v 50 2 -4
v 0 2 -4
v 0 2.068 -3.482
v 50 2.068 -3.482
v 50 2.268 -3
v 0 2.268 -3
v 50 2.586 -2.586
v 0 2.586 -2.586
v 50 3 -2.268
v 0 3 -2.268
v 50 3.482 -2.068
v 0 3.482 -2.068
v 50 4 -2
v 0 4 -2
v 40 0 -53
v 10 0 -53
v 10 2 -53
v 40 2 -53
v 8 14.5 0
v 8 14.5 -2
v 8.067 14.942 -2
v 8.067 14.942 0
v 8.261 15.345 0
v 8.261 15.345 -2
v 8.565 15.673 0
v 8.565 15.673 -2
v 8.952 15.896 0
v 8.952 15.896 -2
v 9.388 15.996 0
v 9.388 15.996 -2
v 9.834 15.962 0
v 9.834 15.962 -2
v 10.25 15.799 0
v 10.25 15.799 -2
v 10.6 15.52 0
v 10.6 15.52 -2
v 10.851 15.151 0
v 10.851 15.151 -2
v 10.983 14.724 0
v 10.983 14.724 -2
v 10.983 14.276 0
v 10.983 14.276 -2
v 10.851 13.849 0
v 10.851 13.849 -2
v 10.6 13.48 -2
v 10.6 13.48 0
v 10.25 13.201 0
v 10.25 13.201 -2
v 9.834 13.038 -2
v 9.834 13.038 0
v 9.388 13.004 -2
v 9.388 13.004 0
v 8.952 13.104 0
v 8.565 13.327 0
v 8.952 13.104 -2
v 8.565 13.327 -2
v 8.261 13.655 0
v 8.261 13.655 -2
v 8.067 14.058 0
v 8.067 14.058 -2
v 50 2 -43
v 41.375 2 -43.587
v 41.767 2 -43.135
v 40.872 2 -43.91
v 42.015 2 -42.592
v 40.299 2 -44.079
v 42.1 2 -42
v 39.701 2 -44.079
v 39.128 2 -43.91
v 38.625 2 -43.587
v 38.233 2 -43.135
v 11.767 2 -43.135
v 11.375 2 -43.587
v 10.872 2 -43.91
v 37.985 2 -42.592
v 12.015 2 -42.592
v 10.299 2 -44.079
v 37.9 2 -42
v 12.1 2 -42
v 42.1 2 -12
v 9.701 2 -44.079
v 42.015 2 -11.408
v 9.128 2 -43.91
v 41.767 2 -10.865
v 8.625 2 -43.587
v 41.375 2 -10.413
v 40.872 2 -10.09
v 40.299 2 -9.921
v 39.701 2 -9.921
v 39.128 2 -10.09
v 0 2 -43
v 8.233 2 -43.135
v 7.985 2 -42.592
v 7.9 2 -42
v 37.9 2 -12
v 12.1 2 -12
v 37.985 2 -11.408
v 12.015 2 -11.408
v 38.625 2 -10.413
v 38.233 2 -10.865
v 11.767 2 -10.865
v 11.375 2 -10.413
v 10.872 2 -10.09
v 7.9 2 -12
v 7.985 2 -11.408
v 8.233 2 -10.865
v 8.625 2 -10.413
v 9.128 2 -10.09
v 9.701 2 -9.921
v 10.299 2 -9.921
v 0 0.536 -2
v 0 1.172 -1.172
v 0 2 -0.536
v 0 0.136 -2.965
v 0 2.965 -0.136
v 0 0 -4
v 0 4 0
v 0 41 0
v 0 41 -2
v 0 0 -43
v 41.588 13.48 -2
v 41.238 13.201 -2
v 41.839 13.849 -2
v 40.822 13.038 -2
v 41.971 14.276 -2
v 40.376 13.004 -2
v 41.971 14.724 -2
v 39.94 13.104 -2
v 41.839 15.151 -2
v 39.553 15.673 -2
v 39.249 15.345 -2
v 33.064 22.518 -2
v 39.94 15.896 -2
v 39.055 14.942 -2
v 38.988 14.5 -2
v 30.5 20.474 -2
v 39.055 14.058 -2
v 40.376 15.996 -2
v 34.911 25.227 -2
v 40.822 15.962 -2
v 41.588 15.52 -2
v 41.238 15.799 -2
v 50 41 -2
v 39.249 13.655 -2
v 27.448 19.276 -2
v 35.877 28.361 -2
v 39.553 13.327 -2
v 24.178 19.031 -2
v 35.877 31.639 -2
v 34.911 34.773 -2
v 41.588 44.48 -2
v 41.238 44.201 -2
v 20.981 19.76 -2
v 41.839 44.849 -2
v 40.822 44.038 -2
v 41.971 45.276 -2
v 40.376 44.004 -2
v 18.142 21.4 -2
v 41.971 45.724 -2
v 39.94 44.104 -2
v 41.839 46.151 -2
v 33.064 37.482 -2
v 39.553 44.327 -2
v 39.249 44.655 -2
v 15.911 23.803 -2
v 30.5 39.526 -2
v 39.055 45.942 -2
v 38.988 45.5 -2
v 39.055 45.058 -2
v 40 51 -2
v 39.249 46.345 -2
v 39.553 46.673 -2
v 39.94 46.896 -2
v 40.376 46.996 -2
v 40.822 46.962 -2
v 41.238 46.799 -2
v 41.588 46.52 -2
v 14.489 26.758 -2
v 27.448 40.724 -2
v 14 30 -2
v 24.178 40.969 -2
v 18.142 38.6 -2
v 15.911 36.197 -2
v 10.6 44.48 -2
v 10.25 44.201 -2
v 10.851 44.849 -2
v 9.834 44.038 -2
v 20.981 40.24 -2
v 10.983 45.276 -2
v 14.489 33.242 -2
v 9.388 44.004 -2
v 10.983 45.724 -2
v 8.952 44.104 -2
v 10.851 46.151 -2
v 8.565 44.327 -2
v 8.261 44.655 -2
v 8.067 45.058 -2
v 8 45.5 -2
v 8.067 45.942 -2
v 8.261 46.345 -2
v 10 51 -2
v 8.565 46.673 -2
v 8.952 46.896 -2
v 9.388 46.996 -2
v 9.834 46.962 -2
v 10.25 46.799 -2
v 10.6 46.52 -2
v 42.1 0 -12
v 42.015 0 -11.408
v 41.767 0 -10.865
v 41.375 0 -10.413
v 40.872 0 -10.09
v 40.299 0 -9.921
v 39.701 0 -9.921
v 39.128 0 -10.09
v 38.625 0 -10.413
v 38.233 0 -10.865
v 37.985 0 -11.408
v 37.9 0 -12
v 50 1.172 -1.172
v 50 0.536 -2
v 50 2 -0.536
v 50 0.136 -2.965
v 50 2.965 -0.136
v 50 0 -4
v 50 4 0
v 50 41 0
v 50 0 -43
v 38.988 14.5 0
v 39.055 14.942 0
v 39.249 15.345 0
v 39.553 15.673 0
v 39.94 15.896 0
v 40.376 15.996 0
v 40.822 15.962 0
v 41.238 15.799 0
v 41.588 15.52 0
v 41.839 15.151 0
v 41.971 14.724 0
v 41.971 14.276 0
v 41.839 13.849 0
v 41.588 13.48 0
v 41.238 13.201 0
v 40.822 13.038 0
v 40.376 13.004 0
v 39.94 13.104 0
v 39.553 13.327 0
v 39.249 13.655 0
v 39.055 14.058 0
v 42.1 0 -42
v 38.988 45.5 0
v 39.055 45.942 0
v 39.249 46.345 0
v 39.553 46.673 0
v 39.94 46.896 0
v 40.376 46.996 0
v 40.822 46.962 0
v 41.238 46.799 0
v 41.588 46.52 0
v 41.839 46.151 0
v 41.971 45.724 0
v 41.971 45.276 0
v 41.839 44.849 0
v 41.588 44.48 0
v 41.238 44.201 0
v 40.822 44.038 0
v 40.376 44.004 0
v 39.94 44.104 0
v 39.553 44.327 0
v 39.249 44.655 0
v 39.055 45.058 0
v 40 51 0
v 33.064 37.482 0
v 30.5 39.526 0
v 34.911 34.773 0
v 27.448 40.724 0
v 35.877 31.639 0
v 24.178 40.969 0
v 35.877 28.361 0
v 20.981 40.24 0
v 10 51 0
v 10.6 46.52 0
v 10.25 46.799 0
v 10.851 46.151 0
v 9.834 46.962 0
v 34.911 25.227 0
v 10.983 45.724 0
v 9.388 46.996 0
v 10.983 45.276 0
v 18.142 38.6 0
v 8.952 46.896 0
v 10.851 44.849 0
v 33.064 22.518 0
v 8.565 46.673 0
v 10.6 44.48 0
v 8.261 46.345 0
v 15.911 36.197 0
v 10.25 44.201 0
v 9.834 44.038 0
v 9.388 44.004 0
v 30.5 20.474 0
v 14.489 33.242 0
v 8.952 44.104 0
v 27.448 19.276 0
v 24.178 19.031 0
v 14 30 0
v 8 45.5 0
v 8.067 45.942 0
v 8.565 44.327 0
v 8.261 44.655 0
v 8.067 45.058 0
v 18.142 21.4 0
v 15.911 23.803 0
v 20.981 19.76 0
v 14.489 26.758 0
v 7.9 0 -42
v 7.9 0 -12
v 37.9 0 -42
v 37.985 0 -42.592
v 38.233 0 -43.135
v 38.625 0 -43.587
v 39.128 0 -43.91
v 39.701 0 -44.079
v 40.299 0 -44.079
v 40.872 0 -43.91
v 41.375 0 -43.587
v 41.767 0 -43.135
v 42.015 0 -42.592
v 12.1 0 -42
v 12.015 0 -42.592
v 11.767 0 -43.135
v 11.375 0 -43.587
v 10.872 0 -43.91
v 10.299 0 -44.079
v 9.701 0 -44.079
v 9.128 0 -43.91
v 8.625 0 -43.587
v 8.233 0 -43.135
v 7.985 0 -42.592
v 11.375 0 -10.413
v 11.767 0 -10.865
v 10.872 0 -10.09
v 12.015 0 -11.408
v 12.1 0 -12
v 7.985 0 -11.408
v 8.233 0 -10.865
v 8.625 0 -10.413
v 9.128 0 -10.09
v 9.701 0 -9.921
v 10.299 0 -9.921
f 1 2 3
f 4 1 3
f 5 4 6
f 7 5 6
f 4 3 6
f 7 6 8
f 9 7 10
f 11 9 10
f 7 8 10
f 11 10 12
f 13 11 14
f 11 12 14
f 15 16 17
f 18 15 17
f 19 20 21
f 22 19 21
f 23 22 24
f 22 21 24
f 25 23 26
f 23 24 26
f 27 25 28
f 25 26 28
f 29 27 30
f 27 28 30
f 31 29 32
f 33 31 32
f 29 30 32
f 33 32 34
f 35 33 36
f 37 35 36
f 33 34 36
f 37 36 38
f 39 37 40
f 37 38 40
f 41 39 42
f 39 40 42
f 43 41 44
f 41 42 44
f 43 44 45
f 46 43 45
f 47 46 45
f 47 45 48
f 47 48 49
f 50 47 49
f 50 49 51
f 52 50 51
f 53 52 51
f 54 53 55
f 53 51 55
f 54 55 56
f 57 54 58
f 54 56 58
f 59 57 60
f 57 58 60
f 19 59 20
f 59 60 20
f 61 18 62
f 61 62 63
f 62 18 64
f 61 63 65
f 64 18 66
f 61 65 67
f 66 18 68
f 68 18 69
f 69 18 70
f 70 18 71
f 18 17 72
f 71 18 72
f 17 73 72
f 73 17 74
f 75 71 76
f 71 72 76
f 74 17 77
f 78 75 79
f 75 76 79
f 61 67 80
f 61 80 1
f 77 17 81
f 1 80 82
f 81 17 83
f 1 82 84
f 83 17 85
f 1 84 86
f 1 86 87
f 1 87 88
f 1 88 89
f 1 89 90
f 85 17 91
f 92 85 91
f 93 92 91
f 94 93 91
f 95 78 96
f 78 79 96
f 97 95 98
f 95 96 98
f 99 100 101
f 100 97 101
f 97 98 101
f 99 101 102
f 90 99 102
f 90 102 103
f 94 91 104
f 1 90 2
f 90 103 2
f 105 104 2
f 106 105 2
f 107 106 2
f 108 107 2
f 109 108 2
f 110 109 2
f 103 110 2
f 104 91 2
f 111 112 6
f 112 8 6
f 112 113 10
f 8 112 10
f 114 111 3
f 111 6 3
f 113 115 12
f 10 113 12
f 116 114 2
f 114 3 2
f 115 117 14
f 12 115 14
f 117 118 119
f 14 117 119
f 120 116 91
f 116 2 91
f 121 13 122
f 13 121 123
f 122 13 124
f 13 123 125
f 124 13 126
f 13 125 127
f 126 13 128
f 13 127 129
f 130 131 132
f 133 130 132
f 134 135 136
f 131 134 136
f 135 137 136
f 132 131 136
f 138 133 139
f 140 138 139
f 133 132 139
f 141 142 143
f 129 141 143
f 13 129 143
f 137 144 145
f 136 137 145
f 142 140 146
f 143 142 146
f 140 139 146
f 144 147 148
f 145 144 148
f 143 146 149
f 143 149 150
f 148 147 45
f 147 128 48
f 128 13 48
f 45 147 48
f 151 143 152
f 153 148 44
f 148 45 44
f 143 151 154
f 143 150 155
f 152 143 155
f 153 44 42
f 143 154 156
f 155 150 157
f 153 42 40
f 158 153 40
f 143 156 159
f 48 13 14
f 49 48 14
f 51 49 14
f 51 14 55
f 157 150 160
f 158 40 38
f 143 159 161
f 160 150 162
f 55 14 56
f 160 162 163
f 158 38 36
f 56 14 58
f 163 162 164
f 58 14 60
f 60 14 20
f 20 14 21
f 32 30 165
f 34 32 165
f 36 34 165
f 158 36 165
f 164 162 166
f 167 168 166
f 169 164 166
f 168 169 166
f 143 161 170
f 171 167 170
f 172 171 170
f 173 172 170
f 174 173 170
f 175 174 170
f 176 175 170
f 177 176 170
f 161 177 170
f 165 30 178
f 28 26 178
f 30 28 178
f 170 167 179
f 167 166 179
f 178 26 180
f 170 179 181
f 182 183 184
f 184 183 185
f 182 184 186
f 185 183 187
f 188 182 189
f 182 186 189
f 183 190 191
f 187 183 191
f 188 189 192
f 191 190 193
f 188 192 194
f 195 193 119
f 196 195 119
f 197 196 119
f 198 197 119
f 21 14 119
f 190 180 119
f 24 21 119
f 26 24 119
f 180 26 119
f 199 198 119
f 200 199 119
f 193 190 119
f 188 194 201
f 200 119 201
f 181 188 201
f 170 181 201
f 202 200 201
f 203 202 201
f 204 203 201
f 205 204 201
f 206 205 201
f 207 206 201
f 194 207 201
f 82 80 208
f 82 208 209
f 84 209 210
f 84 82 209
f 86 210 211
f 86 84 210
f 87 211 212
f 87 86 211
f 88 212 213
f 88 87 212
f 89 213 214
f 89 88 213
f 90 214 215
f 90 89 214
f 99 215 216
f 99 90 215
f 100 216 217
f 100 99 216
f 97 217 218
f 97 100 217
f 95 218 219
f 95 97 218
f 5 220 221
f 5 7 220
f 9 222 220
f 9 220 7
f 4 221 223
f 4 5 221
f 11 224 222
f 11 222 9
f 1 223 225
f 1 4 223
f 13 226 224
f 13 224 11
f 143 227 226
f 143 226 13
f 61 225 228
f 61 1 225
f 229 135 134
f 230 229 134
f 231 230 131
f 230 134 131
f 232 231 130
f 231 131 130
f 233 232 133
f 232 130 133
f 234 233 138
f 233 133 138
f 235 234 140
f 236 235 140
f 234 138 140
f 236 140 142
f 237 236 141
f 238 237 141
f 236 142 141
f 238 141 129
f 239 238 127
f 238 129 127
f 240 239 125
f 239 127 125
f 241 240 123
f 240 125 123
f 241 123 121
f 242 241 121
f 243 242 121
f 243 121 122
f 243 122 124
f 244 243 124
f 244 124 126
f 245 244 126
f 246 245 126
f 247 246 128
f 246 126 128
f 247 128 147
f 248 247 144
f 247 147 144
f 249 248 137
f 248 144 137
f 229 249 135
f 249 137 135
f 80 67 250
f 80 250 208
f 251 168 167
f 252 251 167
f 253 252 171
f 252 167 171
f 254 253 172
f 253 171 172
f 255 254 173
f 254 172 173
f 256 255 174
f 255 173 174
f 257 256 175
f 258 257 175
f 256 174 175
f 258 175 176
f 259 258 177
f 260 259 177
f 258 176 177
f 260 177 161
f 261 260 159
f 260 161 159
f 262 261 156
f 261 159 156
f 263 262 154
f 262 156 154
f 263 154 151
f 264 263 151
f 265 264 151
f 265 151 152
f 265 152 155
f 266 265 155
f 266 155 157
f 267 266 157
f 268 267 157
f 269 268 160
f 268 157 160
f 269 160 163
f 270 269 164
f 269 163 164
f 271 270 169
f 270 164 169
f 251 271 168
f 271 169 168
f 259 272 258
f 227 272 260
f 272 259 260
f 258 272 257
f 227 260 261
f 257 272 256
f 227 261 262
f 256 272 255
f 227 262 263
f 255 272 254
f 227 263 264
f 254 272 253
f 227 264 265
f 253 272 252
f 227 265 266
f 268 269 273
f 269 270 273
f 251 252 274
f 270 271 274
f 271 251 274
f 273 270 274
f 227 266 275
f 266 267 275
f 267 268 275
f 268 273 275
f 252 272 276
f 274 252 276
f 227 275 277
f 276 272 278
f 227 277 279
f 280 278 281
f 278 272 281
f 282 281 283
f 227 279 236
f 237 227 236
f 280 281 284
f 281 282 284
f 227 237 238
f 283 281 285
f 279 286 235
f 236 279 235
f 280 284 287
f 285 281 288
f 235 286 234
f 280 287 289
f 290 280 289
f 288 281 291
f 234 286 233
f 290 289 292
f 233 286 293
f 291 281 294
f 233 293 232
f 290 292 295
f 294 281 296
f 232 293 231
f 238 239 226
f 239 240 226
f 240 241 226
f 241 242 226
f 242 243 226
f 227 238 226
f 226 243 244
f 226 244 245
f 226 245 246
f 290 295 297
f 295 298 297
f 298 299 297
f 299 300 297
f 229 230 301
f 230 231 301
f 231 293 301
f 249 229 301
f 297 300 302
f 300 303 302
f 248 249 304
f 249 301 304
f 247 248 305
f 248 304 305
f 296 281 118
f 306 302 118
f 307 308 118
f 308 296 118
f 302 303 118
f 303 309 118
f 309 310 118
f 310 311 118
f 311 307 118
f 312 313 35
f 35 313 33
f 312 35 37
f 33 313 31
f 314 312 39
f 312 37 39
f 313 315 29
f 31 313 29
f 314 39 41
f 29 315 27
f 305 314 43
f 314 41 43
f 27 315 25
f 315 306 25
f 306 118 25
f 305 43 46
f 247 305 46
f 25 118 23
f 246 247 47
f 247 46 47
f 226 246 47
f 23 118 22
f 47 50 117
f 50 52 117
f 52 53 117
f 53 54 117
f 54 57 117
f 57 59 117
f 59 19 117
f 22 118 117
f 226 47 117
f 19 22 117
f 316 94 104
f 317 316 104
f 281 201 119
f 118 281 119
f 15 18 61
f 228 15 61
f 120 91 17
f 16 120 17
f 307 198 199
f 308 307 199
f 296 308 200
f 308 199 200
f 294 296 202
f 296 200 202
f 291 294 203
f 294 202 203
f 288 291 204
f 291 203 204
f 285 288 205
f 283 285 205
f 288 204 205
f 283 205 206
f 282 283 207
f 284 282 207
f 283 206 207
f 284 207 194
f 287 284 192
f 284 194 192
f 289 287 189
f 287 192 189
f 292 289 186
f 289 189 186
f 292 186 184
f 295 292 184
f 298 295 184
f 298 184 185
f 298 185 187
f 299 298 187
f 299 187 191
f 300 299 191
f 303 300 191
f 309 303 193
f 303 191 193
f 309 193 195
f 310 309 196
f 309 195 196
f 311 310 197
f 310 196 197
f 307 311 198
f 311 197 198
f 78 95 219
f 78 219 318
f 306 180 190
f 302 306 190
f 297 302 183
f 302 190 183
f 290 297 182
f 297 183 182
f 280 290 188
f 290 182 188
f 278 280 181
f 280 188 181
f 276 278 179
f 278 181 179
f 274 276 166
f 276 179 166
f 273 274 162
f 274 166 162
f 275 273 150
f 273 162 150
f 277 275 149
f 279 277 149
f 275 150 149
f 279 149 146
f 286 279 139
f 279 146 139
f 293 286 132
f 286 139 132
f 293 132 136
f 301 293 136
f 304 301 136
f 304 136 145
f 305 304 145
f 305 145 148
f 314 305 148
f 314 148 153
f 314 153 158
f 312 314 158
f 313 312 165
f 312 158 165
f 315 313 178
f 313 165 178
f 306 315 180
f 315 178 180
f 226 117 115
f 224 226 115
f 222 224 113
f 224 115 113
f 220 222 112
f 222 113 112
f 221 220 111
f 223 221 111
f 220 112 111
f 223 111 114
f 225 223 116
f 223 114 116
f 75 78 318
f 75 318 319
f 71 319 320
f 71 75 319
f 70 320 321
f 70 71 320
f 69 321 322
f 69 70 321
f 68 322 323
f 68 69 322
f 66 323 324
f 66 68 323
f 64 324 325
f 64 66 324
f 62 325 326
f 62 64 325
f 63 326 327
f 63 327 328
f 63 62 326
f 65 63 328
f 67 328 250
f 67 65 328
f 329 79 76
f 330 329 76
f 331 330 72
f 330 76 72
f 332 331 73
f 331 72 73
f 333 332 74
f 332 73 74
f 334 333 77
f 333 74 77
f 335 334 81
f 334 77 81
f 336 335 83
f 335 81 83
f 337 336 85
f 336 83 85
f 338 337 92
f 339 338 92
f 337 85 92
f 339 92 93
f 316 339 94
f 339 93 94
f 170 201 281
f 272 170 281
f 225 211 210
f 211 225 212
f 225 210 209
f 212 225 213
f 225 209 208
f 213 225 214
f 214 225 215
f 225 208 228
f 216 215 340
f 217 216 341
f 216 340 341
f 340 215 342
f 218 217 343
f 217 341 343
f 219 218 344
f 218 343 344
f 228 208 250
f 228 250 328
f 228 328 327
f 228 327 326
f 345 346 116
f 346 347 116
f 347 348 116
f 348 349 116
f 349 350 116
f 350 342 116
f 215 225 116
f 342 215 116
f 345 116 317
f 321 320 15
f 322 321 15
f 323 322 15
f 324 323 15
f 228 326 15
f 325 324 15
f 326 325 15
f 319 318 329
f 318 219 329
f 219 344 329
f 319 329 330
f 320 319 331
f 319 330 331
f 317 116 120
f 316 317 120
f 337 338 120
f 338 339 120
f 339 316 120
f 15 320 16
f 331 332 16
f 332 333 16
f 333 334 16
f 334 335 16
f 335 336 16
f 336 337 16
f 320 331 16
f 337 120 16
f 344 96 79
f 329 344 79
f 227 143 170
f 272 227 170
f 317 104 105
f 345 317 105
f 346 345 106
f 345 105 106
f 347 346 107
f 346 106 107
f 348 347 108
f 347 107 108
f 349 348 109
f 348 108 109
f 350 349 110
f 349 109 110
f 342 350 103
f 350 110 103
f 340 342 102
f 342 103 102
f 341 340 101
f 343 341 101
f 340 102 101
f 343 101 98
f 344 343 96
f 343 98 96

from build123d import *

# Parameters (mm, degrees)
BOSS_EXTRUDE1_DEPTH = 50
SKETCH2_R           = 11
SKETCH2_R_2         = 1.5
CUT_EXTRUDE1_DEPTH  = 2
CUT_EXTRUDE2_DEPTH  = 2
CUT_EXTRUDE3_DEPTH  = 2
CUT_EXTRUDE4_DEPTH  = 2


with BuildPart() as part:
    # Sketch1 → Boss-Extrude1 (new body)
    with BuildSketch(Plane(origin=(0, 0, 0), x_dir=(0, 0, -1), z_dir=(1, 0, 0))):
        with BuildLine():
            Line((4, 0), (53, 0))
            Line((53, 0), (53, 2))
            Line((53, 2), (4, 2))
            ThreePointArc((4, 2), (2.585786438, 2.585786438), (2, 4))
            Line((2, 4), (2, 51))
            Line((2, 51), (0, 51))
            Line((0, 51), (0, 4))
            ThreePointArc((0, 4), (1.171572875, 1.171572875), (4, 0))
        make_face()
    extrude(amount=BOSS_EXTRUDE1_DEPTH)

    # Sketch2 → Cut-Extrude1 (cut)
    with BuildSketch(Plane(origin=(0, 0, -2), x_dir=(-1, 0, 0), z_dir=(0, 0, -1))):
        with Locations((-25, 30)):
            Circle(SKETCH2_R)
        with Locations((-9.5, 45.5)):
            Circle(SKETCH2_R_2)
        with Locations((-40.488, 45.5)):
            Circle(SKETCH2_R_2)
        with Locations((-40.488, 14.5)):
            Circle(SKETCH2_R_2)
        with Locations((-9.5, 14.5)):
            Circle(SKETCH2_R_2)
    extrude(amount=-CUT_EXTRUDE1_DEPTH, mode=Mode.SUBTRACT)

    # Sketch3 → Cut-Extrude2 (cut)
    with BuildSketch(Plane(origin=(0, 2, 0), x_dir=(1, 0, 0), z_dir=(0, 1, 0))):
        with BuildLine():
            Line((42.1, 42), (42.1, 12))
            ThreePointArc((42.1, 12), (40, 9.9), (37.9, 12))
            Line((37.9, 12), (37.9, 42))
            ThreePointArc((37.9, 42), (40, 44.1), (42.1, 42))
        make_face()
        with BuildLine():
            Line((7.9, 42), (7.9, 12))
            ThreePointArc((7.9, 12), (10, 9.9), (12.1, 12))
            Line((12.1, 12), (12.1, 42))
            ThreePointArc((12.1, 42), (10, 44.1), (7.9, 42))
        make_face()
    extrude(amount=-CUT_EXTRUDE2_DEPTH, mode=Mode.SUBTRACT)

    # Sketch4 → Cut-Extrude3 (cut)
    with BuildSketch(Plane(origin=(0, 2, 0), x_dir=(1, 0, 0), z_dir=(0, 1, 0))):
        Polygon((0, 53), (0, 43), (10, 53), align=None)
        Polygon((50, 53), (40, 53), (50, 43), align=None)
    extrude(amount=-CUT_EXTRUDE3_DEPTH, mode=Mode.SUBTRACT)

    # Sketch5 → Cut-Extrude4 (cut)
    with BuildSketch(Plane(origin=(0, 0, -2), x_dir=(-1, 0, 0), z_dir=(0, 0, -1))):
        Polygon((-50, 41), (-40, 51), (-50, 51), align=None)
        Polygon((-10, 51), (0, 41), (0, 51), align=None)
    extrude(amount=-CUT_EXTRUDE4_DEPTH, mode=Mode.SUBTRACT)


solid = part.part
